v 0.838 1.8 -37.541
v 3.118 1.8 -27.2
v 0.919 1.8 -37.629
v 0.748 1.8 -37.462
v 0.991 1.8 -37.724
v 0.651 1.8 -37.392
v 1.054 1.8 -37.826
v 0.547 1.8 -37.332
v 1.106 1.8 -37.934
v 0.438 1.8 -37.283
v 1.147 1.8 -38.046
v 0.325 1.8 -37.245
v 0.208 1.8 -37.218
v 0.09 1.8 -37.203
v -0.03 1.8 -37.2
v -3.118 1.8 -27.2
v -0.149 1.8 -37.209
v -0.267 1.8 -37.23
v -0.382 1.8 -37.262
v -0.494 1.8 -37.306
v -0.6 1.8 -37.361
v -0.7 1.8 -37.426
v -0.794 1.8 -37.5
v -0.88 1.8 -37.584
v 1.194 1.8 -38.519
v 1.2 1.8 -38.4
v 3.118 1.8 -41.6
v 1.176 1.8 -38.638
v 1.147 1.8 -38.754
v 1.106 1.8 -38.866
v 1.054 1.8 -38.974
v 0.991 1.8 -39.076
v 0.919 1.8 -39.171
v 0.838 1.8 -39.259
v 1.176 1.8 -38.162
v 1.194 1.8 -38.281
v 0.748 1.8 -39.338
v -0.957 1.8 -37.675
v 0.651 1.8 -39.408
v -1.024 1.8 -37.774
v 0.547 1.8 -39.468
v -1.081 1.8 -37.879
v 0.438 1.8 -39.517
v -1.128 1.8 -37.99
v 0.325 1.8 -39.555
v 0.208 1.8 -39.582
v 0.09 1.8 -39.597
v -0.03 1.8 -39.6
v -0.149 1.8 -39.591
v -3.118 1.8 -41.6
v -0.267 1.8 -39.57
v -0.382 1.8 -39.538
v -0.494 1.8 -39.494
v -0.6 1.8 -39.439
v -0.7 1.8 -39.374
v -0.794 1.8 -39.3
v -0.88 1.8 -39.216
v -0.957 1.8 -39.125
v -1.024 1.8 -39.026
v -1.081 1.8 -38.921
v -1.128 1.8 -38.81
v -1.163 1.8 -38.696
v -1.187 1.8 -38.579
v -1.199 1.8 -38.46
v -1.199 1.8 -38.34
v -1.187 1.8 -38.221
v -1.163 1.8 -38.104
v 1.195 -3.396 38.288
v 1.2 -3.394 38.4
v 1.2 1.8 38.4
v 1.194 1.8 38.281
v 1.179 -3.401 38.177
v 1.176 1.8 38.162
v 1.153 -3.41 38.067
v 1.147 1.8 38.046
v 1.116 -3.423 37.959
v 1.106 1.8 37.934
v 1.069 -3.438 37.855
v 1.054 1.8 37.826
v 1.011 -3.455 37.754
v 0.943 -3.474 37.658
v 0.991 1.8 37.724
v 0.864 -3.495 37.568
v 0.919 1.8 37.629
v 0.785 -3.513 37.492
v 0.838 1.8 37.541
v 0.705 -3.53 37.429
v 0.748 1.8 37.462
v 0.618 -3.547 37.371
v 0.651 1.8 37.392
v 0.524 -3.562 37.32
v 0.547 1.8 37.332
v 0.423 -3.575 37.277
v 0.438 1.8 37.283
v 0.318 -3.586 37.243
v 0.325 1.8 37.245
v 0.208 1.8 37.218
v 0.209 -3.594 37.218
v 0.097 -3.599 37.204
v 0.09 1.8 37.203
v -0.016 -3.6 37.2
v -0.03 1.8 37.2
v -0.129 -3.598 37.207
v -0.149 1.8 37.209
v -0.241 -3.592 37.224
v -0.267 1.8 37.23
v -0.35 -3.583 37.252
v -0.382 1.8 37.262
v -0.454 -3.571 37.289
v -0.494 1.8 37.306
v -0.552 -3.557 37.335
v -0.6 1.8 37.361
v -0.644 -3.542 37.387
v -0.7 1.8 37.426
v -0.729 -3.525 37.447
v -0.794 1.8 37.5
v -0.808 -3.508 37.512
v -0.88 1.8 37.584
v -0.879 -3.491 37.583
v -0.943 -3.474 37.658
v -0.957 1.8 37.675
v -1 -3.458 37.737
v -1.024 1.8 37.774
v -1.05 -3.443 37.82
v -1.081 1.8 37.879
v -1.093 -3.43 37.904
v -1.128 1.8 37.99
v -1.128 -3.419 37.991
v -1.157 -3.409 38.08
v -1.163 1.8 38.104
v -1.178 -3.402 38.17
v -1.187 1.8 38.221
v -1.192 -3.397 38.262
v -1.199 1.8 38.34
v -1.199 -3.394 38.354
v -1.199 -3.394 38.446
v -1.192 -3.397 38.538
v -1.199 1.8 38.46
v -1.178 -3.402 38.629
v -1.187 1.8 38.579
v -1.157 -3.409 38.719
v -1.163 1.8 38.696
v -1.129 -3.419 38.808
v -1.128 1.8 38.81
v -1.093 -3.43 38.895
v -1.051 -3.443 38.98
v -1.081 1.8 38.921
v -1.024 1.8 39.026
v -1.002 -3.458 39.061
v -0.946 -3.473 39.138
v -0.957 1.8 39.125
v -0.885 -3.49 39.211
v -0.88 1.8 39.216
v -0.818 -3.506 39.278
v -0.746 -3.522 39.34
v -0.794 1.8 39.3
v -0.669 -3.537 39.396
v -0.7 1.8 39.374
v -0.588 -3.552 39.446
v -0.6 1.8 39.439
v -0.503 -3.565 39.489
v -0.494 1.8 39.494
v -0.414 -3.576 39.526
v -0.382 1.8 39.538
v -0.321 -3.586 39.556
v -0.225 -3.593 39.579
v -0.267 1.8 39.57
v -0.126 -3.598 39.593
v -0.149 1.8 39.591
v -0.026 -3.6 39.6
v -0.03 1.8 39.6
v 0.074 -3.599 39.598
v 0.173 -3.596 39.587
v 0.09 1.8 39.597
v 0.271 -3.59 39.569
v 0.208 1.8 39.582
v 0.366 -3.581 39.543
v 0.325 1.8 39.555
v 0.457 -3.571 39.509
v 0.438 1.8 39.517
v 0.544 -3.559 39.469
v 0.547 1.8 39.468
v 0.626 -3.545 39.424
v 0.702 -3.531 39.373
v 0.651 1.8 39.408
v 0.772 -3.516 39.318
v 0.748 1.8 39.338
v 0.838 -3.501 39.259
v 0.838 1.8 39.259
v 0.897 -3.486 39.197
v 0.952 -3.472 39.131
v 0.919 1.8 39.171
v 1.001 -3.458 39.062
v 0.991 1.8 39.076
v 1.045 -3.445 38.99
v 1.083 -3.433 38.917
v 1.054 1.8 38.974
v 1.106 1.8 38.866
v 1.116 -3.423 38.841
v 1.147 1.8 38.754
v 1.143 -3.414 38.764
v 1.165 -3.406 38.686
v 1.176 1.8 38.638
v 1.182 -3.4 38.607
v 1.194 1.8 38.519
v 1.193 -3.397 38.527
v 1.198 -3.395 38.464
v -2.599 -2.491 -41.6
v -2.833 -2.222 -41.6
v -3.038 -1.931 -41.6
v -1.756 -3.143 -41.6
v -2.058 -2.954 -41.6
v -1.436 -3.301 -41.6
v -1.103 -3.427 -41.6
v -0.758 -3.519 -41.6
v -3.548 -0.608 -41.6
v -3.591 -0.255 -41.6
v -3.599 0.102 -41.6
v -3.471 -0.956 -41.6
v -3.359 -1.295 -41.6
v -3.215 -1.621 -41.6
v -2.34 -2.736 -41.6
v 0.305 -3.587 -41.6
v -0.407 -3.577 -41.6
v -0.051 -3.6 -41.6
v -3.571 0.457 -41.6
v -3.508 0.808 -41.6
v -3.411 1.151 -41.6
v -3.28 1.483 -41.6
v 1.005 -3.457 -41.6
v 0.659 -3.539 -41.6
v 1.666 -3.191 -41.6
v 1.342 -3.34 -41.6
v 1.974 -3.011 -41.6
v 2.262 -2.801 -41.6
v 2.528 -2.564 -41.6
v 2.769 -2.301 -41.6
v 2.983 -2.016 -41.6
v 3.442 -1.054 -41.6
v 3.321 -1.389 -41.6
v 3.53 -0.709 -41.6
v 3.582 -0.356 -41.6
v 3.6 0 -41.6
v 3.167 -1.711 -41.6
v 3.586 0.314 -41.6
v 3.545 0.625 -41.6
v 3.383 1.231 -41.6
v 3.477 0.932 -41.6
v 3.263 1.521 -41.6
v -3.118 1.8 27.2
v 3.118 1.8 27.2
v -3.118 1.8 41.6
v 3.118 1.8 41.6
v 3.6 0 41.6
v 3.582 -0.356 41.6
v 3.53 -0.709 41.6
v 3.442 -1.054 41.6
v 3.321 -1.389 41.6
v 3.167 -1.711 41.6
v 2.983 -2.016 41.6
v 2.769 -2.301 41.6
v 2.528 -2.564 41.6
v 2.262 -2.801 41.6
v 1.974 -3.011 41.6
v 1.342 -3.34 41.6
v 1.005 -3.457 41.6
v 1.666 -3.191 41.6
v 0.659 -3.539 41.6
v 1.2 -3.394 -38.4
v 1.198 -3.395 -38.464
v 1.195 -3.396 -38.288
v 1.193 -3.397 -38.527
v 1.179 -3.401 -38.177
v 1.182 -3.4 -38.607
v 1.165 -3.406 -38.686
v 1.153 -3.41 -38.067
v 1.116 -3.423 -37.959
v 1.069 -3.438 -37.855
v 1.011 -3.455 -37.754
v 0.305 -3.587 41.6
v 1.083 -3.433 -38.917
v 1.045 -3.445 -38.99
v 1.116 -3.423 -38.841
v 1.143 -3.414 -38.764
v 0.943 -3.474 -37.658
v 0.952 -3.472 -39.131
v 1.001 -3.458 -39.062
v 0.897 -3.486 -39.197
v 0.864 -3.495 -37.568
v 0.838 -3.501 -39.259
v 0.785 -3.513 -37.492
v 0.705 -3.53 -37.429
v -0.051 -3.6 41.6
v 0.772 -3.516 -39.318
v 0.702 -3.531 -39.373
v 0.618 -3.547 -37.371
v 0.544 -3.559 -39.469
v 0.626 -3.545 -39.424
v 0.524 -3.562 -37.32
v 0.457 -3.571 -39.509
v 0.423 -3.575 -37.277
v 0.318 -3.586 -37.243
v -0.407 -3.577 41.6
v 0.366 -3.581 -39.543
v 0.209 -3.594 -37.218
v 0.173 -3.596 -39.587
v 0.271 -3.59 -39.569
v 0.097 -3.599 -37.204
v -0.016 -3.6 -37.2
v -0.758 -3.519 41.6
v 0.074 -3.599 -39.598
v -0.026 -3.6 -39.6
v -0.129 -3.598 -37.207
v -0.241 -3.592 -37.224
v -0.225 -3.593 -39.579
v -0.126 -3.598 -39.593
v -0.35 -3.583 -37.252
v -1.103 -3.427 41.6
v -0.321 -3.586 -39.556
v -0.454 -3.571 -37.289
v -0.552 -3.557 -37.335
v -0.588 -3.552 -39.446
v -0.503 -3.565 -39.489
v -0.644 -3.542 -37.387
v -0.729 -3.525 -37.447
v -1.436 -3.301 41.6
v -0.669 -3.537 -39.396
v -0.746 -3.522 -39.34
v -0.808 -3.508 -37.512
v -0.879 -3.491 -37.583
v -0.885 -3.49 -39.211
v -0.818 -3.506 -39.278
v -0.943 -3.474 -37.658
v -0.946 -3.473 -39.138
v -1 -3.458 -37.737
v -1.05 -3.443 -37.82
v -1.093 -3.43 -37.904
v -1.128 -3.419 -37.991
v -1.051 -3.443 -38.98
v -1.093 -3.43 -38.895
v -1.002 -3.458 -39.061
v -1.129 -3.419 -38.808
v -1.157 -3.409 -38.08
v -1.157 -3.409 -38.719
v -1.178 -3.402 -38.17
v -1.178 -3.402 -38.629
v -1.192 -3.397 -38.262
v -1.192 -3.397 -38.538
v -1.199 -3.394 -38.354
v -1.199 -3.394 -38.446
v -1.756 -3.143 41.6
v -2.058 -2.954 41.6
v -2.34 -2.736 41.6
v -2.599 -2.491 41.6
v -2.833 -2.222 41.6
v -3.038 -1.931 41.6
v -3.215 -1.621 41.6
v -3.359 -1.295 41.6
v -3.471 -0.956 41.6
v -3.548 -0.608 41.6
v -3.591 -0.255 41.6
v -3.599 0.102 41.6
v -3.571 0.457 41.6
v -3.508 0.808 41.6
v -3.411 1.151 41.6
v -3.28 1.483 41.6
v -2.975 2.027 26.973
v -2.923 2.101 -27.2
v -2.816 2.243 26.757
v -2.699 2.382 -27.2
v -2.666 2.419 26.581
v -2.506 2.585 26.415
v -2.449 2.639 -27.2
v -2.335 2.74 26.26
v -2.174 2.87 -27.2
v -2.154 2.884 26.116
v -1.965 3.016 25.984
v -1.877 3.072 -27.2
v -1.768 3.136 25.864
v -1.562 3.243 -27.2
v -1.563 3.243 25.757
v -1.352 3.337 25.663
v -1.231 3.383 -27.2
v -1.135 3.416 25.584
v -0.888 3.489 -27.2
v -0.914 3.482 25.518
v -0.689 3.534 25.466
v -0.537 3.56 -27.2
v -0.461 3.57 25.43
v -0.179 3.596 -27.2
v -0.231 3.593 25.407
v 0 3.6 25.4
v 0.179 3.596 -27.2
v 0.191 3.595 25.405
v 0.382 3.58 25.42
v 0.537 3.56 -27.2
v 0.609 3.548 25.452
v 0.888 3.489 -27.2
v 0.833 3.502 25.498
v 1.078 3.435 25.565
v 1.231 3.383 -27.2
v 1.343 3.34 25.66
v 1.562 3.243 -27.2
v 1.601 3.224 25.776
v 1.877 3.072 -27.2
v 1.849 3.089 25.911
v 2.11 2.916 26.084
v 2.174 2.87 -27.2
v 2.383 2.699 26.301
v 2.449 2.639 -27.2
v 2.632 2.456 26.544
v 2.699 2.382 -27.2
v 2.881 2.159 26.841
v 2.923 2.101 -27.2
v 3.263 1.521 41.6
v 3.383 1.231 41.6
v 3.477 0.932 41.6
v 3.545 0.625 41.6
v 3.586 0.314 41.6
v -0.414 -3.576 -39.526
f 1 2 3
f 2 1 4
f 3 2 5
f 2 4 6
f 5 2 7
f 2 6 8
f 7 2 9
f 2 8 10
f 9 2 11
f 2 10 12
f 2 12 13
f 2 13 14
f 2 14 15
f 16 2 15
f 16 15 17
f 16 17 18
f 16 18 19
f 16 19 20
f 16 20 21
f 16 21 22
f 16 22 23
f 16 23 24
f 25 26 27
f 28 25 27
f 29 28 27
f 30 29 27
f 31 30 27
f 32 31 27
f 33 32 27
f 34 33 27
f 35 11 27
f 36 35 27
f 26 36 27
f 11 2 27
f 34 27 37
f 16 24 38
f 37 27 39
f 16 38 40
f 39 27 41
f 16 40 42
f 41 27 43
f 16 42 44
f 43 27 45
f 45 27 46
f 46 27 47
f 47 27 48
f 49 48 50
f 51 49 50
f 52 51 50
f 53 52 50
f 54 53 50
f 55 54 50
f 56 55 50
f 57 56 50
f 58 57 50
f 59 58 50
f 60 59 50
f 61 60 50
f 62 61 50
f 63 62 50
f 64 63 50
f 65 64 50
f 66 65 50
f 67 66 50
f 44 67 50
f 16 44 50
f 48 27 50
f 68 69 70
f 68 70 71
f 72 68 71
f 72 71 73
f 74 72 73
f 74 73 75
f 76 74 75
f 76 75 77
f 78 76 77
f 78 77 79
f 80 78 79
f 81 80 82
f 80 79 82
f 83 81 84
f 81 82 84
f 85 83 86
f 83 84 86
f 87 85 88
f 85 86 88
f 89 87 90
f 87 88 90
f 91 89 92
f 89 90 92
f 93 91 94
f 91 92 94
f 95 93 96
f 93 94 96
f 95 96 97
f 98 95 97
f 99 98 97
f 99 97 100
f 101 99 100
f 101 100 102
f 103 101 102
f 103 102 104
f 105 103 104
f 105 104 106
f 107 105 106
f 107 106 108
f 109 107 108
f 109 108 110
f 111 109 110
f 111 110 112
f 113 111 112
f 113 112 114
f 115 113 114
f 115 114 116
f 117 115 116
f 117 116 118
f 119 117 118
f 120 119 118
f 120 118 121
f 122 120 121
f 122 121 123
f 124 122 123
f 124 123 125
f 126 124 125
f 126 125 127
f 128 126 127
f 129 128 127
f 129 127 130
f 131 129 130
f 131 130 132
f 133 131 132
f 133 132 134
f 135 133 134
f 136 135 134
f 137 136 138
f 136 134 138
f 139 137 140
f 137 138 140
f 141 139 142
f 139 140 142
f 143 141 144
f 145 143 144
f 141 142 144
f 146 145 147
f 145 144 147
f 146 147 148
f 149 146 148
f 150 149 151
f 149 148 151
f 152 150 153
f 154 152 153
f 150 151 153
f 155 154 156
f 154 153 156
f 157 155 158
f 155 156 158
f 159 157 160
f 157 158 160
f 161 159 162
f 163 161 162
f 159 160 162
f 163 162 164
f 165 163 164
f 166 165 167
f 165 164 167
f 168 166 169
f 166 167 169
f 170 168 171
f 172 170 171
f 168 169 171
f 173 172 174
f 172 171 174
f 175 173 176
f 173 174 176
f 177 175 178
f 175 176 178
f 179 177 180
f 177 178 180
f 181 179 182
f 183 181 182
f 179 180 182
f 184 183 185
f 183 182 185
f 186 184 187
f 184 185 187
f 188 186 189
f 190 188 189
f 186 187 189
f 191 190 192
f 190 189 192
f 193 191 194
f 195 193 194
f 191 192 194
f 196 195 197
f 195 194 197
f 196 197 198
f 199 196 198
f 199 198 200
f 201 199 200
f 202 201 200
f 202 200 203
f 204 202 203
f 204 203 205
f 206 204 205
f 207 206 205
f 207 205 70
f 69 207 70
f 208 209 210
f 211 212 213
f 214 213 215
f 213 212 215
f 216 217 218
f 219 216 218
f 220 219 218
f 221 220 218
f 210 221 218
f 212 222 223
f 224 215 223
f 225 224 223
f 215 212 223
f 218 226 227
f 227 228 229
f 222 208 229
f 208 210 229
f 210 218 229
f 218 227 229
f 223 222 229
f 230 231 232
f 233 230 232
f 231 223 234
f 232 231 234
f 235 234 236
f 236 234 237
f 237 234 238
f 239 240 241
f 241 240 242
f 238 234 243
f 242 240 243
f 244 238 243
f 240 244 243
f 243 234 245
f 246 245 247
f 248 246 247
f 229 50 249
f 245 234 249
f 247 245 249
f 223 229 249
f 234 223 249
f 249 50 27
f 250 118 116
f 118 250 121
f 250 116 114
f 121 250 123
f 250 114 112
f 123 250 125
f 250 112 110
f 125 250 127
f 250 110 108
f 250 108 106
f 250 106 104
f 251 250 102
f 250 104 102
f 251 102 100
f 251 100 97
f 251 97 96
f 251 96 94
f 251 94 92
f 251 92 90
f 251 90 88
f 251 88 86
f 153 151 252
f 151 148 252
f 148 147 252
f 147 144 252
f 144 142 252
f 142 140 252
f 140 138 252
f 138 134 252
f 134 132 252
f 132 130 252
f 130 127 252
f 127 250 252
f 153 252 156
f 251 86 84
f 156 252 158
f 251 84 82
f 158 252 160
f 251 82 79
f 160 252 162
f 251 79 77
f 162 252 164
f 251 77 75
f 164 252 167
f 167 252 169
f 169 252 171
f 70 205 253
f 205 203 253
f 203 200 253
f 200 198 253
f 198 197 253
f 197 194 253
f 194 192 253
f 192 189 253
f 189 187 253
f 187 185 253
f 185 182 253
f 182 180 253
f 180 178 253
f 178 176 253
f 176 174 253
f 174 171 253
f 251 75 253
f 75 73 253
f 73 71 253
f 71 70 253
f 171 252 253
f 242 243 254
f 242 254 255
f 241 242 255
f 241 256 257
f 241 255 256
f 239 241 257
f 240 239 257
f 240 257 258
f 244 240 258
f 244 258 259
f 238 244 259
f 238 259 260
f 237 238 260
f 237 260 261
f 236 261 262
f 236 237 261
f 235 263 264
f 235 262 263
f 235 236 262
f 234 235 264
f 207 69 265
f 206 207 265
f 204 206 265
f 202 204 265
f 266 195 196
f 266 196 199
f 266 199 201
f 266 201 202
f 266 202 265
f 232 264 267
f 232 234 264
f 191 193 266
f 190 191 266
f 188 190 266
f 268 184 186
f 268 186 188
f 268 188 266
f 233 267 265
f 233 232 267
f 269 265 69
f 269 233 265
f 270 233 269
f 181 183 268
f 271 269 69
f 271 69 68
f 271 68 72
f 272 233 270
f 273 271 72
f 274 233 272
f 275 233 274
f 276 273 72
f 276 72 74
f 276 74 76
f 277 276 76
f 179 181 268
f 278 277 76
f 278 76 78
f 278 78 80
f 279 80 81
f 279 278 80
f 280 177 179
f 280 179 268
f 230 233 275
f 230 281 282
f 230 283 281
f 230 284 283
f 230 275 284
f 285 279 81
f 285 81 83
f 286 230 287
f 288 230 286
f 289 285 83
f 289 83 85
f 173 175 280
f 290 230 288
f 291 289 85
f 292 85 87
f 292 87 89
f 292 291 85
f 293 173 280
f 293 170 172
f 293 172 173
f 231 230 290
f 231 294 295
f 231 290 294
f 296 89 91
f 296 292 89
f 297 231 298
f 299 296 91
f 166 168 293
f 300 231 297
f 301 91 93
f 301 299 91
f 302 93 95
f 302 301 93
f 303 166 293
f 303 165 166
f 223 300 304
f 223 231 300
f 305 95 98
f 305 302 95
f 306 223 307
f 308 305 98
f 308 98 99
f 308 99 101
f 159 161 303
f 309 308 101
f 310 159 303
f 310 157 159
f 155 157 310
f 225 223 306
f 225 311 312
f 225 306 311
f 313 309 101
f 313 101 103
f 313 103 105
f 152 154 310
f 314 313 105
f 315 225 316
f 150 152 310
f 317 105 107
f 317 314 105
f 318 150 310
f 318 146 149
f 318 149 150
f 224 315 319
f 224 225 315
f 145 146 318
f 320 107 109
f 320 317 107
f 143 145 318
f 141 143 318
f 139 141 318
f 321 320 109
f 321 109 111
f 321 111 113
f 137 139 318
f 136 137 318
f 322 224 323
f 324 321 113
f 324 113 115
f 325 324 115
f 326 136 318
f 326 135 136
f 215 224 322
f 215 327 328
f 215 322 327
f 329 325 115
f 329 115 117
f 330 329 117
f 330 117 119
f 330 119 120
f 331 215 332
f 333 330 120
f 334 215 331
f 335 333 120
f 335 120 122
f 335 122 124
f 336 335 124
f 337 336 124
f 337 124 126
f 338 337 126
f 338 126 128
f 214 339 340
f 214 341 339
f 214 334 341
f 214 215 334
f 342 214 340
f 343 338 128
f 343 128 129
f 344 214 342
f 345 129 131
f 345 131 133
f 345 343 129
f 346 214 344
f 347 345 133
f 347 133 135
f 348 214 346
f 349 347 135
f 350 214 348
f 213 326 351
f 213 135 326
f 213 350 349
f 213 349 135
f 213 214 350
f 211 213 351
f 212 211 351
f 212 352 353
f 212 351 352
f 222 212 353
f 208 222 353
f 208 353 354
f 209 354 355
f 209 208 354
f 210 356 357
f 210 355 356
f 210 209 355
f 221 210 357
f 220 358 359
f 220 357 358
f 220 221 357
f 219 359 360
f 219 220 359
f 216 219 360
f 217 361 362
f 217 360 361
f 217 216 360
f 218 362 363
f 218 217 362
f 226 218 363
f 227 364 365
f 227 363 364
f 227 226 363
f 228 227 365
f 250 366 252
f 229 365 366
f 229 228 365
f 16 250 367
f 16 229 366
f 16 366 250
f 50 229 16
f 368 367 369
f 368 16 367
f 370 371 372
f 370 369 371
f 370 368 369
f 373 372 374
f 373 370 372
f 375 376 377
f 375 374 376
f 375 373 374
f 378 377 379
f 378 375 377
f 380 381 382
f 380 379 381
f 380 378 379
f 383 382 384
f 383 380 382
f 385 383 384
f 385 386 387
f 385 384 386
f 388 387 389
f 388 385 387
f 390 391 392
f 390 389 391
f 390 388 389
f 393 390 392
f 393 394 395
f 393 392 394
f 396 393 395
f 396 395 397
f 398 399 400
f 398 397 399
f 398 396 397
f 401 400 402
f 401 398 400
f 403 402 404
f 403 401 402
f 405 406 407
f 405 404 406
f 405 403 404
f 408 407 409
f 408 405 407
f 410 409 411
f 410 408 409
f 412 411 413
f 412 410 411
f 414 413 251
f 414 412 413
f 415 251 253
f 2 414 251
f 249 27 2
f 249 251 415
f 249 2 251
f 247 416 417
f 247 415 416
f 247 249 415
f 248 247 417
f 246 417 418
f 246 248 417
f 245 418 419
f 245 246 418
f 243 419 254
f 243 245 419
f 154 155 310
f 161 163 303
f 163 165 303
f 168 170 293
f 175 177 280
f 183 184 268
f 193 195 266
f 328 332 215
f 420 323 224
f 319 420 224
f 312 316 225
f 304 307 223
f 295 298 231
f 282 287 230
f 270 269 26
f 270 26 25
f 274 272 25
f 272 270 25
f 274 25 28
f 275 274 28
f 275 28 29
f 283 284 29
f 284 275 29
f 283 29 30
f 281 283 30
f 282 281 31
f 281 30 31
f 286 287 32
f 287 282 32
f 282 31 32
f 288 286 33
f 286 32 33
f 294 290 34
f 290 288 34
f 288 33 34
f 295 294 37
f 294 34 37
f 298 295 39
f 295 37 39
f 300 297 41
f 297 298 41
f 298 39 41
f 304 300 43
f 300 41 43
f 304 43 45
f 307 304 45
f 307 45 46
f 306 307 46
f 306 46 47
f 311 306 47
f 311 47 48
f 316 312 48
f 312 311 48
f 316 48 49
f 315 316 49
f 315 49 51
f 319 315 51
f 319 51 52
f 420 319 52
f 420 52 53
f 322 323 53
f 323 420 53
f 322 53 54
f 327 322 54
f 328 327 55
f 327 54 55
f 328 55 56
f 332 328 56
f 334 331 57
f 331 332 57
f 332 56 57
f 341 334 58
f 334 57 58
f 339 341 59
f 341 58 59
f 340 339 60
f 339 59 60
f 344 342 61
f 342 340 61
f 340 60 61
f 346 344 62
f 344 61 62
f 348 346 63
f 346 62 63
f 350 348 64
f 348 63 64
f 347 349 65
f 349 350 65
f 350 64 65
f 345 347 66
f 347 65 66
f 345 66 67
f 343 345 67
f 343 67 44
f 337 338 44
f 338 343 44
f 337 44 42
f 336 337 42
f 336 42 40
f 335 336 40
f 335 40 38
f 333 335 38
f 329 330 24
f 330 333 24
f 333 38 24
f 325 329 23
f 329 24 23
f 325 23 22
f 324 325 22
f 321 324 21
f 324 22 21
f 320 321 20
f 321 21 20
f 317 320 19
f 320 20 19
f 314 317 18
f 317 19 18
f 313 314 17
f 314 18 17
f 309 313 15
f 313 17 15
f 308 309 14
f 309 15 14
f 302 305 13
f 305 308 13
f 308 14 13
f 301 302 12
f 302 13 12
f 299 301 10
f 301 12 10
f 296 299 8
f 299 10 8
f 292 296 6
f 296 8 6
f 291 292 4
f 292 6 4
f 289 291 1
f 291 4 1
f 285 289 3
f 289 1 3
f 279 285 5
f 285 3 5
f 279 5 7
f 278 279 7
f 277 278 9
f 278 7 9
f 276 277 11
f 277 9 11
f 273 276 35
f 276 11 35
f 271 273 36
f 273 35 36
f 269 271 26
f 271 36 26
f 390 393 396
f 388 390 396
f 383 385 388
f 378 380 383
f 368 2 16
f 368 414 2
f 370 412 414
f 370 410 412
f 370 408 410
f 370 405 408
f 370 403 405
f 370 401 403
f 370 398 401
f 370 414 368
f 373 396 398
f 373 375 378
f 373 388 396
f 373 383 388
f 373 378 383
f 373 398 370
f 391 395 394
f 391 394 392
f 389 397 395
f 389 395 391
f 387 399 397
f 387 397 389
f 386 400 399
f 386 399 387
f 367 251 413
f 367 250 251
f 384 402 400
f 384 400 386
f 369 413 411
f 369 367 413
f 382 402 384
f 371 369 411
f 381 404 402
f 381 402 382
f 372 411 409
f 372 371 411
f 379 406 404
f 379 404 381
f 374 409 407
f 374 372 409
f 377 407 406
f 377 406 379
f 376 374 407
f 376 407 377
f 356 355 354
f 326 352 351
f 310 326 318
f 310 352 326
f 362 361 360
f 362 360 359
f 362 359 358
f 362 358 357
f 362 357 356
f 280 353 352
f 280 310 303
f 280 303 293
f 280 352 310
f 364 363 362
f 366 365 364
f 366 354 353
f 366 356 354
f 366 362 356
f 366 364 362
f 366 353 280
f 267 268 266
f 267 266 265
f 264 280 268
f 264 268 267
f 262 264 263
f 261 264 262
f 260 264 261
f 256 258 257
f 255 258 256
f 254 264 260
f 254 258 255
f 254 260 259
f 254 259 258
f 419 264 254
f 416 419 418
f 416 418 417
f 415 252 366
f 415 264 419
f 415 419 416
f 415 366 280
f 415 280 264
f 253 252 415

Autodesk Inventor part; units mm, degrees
ref_plane "YZ Plane" through (0, 0, 0) normal (1, 0, 0) x (0, 1, 0)
ref_plane "XZ Plane" through (0, 0, 0) normal (0, 1, 0) x (-1, 0, 0)
ref_plane "XY Plane" through (0, 0, 0) normal (0, 0, 1) x (1, 0, 0)
sketch "Sketch1" plane through (0, 0, 0) normal (0, 0, 1) x (1, 0, 0)
  circle A0 centre (0, 0) radius 3.6
  dimension "d0" = 7.2
extrude "Extrusion1" add sketch "Sketch1" along normal mid plane 83.2
sketch "Sketch2" plane through (0, 0, 41.6) normal (0, 0, 1) x (1, 0, 0)
  circle A0 centre (0, 0) radius 3.6 projected
  line L0 (-3.1177, 1.8) -> (3.1177, 1.8)
  dimension "d3" = 1.8
extrude "Extrusion2" cut sketch "Sketch2" against normal blind 14.4 contours L0 A0 picked at (-0.8728, 2.0235)
sketch "Sketch3" plane through (-3.1177, 1.8, 41.6) normal (0, 1, 0) x (1, 0, 0)
  line L0 (3.1177, 99.84) -> (3.1177, -16.64) projected
  circle A0 centre (3.1177, 3.2) radius 1.2
  line L1 (6.2354, 0) -> (0, 0) projected
  point P0 (3.1177, 41.6)
  dimension "d6" = 3.2
  dimension "d7" = 2.4
extrude "Extrusion3" cut sketch "Sketch3" against normal through all
mirror "Mirror1" about plane through (0, 0, 0) normal (0, 0, 1) of "Extrusion2", "Extrusion3"
sketch "Sketch4" plane through (0, 0, 0) normal (1, 0, 0) x (0, 1, 0)
  line L0 (1.8, 27.2) -> (3.6, 27.2) projected
  line L1 (3.6, -27.2) -> (3.6, 27.2) projected
  line L2 (1.8, 27.2) -> (3.6, 25.4)
  point P0 (0, 0)
  dimension "d10" = 45
extrude "Extrusion4" cut sketch "Sketch4" along normal through all both and the other way through all
sketch "Sketch5" plane through (0, 0, 41.6) normal (0, 0, 1) x (1, 0, 0)
  line L0 (3.1177, 1.8) -> (-3.1177, 1.8) projected
  arc A0 (-3.1177, 1.8) -> (3.1177, 1.8) centre (0, 0) ccw projected
  line L1 (-5.265, 6.8) -> (5.265, 6.8)
  arc A1 (-5.265, 6.8) -> (5.265, 6.8) centre (0, 0) ccw
  dimension "d13" = 5
extrude "Extrusion5" [suppressed]
properties part number "Rear Axle"
